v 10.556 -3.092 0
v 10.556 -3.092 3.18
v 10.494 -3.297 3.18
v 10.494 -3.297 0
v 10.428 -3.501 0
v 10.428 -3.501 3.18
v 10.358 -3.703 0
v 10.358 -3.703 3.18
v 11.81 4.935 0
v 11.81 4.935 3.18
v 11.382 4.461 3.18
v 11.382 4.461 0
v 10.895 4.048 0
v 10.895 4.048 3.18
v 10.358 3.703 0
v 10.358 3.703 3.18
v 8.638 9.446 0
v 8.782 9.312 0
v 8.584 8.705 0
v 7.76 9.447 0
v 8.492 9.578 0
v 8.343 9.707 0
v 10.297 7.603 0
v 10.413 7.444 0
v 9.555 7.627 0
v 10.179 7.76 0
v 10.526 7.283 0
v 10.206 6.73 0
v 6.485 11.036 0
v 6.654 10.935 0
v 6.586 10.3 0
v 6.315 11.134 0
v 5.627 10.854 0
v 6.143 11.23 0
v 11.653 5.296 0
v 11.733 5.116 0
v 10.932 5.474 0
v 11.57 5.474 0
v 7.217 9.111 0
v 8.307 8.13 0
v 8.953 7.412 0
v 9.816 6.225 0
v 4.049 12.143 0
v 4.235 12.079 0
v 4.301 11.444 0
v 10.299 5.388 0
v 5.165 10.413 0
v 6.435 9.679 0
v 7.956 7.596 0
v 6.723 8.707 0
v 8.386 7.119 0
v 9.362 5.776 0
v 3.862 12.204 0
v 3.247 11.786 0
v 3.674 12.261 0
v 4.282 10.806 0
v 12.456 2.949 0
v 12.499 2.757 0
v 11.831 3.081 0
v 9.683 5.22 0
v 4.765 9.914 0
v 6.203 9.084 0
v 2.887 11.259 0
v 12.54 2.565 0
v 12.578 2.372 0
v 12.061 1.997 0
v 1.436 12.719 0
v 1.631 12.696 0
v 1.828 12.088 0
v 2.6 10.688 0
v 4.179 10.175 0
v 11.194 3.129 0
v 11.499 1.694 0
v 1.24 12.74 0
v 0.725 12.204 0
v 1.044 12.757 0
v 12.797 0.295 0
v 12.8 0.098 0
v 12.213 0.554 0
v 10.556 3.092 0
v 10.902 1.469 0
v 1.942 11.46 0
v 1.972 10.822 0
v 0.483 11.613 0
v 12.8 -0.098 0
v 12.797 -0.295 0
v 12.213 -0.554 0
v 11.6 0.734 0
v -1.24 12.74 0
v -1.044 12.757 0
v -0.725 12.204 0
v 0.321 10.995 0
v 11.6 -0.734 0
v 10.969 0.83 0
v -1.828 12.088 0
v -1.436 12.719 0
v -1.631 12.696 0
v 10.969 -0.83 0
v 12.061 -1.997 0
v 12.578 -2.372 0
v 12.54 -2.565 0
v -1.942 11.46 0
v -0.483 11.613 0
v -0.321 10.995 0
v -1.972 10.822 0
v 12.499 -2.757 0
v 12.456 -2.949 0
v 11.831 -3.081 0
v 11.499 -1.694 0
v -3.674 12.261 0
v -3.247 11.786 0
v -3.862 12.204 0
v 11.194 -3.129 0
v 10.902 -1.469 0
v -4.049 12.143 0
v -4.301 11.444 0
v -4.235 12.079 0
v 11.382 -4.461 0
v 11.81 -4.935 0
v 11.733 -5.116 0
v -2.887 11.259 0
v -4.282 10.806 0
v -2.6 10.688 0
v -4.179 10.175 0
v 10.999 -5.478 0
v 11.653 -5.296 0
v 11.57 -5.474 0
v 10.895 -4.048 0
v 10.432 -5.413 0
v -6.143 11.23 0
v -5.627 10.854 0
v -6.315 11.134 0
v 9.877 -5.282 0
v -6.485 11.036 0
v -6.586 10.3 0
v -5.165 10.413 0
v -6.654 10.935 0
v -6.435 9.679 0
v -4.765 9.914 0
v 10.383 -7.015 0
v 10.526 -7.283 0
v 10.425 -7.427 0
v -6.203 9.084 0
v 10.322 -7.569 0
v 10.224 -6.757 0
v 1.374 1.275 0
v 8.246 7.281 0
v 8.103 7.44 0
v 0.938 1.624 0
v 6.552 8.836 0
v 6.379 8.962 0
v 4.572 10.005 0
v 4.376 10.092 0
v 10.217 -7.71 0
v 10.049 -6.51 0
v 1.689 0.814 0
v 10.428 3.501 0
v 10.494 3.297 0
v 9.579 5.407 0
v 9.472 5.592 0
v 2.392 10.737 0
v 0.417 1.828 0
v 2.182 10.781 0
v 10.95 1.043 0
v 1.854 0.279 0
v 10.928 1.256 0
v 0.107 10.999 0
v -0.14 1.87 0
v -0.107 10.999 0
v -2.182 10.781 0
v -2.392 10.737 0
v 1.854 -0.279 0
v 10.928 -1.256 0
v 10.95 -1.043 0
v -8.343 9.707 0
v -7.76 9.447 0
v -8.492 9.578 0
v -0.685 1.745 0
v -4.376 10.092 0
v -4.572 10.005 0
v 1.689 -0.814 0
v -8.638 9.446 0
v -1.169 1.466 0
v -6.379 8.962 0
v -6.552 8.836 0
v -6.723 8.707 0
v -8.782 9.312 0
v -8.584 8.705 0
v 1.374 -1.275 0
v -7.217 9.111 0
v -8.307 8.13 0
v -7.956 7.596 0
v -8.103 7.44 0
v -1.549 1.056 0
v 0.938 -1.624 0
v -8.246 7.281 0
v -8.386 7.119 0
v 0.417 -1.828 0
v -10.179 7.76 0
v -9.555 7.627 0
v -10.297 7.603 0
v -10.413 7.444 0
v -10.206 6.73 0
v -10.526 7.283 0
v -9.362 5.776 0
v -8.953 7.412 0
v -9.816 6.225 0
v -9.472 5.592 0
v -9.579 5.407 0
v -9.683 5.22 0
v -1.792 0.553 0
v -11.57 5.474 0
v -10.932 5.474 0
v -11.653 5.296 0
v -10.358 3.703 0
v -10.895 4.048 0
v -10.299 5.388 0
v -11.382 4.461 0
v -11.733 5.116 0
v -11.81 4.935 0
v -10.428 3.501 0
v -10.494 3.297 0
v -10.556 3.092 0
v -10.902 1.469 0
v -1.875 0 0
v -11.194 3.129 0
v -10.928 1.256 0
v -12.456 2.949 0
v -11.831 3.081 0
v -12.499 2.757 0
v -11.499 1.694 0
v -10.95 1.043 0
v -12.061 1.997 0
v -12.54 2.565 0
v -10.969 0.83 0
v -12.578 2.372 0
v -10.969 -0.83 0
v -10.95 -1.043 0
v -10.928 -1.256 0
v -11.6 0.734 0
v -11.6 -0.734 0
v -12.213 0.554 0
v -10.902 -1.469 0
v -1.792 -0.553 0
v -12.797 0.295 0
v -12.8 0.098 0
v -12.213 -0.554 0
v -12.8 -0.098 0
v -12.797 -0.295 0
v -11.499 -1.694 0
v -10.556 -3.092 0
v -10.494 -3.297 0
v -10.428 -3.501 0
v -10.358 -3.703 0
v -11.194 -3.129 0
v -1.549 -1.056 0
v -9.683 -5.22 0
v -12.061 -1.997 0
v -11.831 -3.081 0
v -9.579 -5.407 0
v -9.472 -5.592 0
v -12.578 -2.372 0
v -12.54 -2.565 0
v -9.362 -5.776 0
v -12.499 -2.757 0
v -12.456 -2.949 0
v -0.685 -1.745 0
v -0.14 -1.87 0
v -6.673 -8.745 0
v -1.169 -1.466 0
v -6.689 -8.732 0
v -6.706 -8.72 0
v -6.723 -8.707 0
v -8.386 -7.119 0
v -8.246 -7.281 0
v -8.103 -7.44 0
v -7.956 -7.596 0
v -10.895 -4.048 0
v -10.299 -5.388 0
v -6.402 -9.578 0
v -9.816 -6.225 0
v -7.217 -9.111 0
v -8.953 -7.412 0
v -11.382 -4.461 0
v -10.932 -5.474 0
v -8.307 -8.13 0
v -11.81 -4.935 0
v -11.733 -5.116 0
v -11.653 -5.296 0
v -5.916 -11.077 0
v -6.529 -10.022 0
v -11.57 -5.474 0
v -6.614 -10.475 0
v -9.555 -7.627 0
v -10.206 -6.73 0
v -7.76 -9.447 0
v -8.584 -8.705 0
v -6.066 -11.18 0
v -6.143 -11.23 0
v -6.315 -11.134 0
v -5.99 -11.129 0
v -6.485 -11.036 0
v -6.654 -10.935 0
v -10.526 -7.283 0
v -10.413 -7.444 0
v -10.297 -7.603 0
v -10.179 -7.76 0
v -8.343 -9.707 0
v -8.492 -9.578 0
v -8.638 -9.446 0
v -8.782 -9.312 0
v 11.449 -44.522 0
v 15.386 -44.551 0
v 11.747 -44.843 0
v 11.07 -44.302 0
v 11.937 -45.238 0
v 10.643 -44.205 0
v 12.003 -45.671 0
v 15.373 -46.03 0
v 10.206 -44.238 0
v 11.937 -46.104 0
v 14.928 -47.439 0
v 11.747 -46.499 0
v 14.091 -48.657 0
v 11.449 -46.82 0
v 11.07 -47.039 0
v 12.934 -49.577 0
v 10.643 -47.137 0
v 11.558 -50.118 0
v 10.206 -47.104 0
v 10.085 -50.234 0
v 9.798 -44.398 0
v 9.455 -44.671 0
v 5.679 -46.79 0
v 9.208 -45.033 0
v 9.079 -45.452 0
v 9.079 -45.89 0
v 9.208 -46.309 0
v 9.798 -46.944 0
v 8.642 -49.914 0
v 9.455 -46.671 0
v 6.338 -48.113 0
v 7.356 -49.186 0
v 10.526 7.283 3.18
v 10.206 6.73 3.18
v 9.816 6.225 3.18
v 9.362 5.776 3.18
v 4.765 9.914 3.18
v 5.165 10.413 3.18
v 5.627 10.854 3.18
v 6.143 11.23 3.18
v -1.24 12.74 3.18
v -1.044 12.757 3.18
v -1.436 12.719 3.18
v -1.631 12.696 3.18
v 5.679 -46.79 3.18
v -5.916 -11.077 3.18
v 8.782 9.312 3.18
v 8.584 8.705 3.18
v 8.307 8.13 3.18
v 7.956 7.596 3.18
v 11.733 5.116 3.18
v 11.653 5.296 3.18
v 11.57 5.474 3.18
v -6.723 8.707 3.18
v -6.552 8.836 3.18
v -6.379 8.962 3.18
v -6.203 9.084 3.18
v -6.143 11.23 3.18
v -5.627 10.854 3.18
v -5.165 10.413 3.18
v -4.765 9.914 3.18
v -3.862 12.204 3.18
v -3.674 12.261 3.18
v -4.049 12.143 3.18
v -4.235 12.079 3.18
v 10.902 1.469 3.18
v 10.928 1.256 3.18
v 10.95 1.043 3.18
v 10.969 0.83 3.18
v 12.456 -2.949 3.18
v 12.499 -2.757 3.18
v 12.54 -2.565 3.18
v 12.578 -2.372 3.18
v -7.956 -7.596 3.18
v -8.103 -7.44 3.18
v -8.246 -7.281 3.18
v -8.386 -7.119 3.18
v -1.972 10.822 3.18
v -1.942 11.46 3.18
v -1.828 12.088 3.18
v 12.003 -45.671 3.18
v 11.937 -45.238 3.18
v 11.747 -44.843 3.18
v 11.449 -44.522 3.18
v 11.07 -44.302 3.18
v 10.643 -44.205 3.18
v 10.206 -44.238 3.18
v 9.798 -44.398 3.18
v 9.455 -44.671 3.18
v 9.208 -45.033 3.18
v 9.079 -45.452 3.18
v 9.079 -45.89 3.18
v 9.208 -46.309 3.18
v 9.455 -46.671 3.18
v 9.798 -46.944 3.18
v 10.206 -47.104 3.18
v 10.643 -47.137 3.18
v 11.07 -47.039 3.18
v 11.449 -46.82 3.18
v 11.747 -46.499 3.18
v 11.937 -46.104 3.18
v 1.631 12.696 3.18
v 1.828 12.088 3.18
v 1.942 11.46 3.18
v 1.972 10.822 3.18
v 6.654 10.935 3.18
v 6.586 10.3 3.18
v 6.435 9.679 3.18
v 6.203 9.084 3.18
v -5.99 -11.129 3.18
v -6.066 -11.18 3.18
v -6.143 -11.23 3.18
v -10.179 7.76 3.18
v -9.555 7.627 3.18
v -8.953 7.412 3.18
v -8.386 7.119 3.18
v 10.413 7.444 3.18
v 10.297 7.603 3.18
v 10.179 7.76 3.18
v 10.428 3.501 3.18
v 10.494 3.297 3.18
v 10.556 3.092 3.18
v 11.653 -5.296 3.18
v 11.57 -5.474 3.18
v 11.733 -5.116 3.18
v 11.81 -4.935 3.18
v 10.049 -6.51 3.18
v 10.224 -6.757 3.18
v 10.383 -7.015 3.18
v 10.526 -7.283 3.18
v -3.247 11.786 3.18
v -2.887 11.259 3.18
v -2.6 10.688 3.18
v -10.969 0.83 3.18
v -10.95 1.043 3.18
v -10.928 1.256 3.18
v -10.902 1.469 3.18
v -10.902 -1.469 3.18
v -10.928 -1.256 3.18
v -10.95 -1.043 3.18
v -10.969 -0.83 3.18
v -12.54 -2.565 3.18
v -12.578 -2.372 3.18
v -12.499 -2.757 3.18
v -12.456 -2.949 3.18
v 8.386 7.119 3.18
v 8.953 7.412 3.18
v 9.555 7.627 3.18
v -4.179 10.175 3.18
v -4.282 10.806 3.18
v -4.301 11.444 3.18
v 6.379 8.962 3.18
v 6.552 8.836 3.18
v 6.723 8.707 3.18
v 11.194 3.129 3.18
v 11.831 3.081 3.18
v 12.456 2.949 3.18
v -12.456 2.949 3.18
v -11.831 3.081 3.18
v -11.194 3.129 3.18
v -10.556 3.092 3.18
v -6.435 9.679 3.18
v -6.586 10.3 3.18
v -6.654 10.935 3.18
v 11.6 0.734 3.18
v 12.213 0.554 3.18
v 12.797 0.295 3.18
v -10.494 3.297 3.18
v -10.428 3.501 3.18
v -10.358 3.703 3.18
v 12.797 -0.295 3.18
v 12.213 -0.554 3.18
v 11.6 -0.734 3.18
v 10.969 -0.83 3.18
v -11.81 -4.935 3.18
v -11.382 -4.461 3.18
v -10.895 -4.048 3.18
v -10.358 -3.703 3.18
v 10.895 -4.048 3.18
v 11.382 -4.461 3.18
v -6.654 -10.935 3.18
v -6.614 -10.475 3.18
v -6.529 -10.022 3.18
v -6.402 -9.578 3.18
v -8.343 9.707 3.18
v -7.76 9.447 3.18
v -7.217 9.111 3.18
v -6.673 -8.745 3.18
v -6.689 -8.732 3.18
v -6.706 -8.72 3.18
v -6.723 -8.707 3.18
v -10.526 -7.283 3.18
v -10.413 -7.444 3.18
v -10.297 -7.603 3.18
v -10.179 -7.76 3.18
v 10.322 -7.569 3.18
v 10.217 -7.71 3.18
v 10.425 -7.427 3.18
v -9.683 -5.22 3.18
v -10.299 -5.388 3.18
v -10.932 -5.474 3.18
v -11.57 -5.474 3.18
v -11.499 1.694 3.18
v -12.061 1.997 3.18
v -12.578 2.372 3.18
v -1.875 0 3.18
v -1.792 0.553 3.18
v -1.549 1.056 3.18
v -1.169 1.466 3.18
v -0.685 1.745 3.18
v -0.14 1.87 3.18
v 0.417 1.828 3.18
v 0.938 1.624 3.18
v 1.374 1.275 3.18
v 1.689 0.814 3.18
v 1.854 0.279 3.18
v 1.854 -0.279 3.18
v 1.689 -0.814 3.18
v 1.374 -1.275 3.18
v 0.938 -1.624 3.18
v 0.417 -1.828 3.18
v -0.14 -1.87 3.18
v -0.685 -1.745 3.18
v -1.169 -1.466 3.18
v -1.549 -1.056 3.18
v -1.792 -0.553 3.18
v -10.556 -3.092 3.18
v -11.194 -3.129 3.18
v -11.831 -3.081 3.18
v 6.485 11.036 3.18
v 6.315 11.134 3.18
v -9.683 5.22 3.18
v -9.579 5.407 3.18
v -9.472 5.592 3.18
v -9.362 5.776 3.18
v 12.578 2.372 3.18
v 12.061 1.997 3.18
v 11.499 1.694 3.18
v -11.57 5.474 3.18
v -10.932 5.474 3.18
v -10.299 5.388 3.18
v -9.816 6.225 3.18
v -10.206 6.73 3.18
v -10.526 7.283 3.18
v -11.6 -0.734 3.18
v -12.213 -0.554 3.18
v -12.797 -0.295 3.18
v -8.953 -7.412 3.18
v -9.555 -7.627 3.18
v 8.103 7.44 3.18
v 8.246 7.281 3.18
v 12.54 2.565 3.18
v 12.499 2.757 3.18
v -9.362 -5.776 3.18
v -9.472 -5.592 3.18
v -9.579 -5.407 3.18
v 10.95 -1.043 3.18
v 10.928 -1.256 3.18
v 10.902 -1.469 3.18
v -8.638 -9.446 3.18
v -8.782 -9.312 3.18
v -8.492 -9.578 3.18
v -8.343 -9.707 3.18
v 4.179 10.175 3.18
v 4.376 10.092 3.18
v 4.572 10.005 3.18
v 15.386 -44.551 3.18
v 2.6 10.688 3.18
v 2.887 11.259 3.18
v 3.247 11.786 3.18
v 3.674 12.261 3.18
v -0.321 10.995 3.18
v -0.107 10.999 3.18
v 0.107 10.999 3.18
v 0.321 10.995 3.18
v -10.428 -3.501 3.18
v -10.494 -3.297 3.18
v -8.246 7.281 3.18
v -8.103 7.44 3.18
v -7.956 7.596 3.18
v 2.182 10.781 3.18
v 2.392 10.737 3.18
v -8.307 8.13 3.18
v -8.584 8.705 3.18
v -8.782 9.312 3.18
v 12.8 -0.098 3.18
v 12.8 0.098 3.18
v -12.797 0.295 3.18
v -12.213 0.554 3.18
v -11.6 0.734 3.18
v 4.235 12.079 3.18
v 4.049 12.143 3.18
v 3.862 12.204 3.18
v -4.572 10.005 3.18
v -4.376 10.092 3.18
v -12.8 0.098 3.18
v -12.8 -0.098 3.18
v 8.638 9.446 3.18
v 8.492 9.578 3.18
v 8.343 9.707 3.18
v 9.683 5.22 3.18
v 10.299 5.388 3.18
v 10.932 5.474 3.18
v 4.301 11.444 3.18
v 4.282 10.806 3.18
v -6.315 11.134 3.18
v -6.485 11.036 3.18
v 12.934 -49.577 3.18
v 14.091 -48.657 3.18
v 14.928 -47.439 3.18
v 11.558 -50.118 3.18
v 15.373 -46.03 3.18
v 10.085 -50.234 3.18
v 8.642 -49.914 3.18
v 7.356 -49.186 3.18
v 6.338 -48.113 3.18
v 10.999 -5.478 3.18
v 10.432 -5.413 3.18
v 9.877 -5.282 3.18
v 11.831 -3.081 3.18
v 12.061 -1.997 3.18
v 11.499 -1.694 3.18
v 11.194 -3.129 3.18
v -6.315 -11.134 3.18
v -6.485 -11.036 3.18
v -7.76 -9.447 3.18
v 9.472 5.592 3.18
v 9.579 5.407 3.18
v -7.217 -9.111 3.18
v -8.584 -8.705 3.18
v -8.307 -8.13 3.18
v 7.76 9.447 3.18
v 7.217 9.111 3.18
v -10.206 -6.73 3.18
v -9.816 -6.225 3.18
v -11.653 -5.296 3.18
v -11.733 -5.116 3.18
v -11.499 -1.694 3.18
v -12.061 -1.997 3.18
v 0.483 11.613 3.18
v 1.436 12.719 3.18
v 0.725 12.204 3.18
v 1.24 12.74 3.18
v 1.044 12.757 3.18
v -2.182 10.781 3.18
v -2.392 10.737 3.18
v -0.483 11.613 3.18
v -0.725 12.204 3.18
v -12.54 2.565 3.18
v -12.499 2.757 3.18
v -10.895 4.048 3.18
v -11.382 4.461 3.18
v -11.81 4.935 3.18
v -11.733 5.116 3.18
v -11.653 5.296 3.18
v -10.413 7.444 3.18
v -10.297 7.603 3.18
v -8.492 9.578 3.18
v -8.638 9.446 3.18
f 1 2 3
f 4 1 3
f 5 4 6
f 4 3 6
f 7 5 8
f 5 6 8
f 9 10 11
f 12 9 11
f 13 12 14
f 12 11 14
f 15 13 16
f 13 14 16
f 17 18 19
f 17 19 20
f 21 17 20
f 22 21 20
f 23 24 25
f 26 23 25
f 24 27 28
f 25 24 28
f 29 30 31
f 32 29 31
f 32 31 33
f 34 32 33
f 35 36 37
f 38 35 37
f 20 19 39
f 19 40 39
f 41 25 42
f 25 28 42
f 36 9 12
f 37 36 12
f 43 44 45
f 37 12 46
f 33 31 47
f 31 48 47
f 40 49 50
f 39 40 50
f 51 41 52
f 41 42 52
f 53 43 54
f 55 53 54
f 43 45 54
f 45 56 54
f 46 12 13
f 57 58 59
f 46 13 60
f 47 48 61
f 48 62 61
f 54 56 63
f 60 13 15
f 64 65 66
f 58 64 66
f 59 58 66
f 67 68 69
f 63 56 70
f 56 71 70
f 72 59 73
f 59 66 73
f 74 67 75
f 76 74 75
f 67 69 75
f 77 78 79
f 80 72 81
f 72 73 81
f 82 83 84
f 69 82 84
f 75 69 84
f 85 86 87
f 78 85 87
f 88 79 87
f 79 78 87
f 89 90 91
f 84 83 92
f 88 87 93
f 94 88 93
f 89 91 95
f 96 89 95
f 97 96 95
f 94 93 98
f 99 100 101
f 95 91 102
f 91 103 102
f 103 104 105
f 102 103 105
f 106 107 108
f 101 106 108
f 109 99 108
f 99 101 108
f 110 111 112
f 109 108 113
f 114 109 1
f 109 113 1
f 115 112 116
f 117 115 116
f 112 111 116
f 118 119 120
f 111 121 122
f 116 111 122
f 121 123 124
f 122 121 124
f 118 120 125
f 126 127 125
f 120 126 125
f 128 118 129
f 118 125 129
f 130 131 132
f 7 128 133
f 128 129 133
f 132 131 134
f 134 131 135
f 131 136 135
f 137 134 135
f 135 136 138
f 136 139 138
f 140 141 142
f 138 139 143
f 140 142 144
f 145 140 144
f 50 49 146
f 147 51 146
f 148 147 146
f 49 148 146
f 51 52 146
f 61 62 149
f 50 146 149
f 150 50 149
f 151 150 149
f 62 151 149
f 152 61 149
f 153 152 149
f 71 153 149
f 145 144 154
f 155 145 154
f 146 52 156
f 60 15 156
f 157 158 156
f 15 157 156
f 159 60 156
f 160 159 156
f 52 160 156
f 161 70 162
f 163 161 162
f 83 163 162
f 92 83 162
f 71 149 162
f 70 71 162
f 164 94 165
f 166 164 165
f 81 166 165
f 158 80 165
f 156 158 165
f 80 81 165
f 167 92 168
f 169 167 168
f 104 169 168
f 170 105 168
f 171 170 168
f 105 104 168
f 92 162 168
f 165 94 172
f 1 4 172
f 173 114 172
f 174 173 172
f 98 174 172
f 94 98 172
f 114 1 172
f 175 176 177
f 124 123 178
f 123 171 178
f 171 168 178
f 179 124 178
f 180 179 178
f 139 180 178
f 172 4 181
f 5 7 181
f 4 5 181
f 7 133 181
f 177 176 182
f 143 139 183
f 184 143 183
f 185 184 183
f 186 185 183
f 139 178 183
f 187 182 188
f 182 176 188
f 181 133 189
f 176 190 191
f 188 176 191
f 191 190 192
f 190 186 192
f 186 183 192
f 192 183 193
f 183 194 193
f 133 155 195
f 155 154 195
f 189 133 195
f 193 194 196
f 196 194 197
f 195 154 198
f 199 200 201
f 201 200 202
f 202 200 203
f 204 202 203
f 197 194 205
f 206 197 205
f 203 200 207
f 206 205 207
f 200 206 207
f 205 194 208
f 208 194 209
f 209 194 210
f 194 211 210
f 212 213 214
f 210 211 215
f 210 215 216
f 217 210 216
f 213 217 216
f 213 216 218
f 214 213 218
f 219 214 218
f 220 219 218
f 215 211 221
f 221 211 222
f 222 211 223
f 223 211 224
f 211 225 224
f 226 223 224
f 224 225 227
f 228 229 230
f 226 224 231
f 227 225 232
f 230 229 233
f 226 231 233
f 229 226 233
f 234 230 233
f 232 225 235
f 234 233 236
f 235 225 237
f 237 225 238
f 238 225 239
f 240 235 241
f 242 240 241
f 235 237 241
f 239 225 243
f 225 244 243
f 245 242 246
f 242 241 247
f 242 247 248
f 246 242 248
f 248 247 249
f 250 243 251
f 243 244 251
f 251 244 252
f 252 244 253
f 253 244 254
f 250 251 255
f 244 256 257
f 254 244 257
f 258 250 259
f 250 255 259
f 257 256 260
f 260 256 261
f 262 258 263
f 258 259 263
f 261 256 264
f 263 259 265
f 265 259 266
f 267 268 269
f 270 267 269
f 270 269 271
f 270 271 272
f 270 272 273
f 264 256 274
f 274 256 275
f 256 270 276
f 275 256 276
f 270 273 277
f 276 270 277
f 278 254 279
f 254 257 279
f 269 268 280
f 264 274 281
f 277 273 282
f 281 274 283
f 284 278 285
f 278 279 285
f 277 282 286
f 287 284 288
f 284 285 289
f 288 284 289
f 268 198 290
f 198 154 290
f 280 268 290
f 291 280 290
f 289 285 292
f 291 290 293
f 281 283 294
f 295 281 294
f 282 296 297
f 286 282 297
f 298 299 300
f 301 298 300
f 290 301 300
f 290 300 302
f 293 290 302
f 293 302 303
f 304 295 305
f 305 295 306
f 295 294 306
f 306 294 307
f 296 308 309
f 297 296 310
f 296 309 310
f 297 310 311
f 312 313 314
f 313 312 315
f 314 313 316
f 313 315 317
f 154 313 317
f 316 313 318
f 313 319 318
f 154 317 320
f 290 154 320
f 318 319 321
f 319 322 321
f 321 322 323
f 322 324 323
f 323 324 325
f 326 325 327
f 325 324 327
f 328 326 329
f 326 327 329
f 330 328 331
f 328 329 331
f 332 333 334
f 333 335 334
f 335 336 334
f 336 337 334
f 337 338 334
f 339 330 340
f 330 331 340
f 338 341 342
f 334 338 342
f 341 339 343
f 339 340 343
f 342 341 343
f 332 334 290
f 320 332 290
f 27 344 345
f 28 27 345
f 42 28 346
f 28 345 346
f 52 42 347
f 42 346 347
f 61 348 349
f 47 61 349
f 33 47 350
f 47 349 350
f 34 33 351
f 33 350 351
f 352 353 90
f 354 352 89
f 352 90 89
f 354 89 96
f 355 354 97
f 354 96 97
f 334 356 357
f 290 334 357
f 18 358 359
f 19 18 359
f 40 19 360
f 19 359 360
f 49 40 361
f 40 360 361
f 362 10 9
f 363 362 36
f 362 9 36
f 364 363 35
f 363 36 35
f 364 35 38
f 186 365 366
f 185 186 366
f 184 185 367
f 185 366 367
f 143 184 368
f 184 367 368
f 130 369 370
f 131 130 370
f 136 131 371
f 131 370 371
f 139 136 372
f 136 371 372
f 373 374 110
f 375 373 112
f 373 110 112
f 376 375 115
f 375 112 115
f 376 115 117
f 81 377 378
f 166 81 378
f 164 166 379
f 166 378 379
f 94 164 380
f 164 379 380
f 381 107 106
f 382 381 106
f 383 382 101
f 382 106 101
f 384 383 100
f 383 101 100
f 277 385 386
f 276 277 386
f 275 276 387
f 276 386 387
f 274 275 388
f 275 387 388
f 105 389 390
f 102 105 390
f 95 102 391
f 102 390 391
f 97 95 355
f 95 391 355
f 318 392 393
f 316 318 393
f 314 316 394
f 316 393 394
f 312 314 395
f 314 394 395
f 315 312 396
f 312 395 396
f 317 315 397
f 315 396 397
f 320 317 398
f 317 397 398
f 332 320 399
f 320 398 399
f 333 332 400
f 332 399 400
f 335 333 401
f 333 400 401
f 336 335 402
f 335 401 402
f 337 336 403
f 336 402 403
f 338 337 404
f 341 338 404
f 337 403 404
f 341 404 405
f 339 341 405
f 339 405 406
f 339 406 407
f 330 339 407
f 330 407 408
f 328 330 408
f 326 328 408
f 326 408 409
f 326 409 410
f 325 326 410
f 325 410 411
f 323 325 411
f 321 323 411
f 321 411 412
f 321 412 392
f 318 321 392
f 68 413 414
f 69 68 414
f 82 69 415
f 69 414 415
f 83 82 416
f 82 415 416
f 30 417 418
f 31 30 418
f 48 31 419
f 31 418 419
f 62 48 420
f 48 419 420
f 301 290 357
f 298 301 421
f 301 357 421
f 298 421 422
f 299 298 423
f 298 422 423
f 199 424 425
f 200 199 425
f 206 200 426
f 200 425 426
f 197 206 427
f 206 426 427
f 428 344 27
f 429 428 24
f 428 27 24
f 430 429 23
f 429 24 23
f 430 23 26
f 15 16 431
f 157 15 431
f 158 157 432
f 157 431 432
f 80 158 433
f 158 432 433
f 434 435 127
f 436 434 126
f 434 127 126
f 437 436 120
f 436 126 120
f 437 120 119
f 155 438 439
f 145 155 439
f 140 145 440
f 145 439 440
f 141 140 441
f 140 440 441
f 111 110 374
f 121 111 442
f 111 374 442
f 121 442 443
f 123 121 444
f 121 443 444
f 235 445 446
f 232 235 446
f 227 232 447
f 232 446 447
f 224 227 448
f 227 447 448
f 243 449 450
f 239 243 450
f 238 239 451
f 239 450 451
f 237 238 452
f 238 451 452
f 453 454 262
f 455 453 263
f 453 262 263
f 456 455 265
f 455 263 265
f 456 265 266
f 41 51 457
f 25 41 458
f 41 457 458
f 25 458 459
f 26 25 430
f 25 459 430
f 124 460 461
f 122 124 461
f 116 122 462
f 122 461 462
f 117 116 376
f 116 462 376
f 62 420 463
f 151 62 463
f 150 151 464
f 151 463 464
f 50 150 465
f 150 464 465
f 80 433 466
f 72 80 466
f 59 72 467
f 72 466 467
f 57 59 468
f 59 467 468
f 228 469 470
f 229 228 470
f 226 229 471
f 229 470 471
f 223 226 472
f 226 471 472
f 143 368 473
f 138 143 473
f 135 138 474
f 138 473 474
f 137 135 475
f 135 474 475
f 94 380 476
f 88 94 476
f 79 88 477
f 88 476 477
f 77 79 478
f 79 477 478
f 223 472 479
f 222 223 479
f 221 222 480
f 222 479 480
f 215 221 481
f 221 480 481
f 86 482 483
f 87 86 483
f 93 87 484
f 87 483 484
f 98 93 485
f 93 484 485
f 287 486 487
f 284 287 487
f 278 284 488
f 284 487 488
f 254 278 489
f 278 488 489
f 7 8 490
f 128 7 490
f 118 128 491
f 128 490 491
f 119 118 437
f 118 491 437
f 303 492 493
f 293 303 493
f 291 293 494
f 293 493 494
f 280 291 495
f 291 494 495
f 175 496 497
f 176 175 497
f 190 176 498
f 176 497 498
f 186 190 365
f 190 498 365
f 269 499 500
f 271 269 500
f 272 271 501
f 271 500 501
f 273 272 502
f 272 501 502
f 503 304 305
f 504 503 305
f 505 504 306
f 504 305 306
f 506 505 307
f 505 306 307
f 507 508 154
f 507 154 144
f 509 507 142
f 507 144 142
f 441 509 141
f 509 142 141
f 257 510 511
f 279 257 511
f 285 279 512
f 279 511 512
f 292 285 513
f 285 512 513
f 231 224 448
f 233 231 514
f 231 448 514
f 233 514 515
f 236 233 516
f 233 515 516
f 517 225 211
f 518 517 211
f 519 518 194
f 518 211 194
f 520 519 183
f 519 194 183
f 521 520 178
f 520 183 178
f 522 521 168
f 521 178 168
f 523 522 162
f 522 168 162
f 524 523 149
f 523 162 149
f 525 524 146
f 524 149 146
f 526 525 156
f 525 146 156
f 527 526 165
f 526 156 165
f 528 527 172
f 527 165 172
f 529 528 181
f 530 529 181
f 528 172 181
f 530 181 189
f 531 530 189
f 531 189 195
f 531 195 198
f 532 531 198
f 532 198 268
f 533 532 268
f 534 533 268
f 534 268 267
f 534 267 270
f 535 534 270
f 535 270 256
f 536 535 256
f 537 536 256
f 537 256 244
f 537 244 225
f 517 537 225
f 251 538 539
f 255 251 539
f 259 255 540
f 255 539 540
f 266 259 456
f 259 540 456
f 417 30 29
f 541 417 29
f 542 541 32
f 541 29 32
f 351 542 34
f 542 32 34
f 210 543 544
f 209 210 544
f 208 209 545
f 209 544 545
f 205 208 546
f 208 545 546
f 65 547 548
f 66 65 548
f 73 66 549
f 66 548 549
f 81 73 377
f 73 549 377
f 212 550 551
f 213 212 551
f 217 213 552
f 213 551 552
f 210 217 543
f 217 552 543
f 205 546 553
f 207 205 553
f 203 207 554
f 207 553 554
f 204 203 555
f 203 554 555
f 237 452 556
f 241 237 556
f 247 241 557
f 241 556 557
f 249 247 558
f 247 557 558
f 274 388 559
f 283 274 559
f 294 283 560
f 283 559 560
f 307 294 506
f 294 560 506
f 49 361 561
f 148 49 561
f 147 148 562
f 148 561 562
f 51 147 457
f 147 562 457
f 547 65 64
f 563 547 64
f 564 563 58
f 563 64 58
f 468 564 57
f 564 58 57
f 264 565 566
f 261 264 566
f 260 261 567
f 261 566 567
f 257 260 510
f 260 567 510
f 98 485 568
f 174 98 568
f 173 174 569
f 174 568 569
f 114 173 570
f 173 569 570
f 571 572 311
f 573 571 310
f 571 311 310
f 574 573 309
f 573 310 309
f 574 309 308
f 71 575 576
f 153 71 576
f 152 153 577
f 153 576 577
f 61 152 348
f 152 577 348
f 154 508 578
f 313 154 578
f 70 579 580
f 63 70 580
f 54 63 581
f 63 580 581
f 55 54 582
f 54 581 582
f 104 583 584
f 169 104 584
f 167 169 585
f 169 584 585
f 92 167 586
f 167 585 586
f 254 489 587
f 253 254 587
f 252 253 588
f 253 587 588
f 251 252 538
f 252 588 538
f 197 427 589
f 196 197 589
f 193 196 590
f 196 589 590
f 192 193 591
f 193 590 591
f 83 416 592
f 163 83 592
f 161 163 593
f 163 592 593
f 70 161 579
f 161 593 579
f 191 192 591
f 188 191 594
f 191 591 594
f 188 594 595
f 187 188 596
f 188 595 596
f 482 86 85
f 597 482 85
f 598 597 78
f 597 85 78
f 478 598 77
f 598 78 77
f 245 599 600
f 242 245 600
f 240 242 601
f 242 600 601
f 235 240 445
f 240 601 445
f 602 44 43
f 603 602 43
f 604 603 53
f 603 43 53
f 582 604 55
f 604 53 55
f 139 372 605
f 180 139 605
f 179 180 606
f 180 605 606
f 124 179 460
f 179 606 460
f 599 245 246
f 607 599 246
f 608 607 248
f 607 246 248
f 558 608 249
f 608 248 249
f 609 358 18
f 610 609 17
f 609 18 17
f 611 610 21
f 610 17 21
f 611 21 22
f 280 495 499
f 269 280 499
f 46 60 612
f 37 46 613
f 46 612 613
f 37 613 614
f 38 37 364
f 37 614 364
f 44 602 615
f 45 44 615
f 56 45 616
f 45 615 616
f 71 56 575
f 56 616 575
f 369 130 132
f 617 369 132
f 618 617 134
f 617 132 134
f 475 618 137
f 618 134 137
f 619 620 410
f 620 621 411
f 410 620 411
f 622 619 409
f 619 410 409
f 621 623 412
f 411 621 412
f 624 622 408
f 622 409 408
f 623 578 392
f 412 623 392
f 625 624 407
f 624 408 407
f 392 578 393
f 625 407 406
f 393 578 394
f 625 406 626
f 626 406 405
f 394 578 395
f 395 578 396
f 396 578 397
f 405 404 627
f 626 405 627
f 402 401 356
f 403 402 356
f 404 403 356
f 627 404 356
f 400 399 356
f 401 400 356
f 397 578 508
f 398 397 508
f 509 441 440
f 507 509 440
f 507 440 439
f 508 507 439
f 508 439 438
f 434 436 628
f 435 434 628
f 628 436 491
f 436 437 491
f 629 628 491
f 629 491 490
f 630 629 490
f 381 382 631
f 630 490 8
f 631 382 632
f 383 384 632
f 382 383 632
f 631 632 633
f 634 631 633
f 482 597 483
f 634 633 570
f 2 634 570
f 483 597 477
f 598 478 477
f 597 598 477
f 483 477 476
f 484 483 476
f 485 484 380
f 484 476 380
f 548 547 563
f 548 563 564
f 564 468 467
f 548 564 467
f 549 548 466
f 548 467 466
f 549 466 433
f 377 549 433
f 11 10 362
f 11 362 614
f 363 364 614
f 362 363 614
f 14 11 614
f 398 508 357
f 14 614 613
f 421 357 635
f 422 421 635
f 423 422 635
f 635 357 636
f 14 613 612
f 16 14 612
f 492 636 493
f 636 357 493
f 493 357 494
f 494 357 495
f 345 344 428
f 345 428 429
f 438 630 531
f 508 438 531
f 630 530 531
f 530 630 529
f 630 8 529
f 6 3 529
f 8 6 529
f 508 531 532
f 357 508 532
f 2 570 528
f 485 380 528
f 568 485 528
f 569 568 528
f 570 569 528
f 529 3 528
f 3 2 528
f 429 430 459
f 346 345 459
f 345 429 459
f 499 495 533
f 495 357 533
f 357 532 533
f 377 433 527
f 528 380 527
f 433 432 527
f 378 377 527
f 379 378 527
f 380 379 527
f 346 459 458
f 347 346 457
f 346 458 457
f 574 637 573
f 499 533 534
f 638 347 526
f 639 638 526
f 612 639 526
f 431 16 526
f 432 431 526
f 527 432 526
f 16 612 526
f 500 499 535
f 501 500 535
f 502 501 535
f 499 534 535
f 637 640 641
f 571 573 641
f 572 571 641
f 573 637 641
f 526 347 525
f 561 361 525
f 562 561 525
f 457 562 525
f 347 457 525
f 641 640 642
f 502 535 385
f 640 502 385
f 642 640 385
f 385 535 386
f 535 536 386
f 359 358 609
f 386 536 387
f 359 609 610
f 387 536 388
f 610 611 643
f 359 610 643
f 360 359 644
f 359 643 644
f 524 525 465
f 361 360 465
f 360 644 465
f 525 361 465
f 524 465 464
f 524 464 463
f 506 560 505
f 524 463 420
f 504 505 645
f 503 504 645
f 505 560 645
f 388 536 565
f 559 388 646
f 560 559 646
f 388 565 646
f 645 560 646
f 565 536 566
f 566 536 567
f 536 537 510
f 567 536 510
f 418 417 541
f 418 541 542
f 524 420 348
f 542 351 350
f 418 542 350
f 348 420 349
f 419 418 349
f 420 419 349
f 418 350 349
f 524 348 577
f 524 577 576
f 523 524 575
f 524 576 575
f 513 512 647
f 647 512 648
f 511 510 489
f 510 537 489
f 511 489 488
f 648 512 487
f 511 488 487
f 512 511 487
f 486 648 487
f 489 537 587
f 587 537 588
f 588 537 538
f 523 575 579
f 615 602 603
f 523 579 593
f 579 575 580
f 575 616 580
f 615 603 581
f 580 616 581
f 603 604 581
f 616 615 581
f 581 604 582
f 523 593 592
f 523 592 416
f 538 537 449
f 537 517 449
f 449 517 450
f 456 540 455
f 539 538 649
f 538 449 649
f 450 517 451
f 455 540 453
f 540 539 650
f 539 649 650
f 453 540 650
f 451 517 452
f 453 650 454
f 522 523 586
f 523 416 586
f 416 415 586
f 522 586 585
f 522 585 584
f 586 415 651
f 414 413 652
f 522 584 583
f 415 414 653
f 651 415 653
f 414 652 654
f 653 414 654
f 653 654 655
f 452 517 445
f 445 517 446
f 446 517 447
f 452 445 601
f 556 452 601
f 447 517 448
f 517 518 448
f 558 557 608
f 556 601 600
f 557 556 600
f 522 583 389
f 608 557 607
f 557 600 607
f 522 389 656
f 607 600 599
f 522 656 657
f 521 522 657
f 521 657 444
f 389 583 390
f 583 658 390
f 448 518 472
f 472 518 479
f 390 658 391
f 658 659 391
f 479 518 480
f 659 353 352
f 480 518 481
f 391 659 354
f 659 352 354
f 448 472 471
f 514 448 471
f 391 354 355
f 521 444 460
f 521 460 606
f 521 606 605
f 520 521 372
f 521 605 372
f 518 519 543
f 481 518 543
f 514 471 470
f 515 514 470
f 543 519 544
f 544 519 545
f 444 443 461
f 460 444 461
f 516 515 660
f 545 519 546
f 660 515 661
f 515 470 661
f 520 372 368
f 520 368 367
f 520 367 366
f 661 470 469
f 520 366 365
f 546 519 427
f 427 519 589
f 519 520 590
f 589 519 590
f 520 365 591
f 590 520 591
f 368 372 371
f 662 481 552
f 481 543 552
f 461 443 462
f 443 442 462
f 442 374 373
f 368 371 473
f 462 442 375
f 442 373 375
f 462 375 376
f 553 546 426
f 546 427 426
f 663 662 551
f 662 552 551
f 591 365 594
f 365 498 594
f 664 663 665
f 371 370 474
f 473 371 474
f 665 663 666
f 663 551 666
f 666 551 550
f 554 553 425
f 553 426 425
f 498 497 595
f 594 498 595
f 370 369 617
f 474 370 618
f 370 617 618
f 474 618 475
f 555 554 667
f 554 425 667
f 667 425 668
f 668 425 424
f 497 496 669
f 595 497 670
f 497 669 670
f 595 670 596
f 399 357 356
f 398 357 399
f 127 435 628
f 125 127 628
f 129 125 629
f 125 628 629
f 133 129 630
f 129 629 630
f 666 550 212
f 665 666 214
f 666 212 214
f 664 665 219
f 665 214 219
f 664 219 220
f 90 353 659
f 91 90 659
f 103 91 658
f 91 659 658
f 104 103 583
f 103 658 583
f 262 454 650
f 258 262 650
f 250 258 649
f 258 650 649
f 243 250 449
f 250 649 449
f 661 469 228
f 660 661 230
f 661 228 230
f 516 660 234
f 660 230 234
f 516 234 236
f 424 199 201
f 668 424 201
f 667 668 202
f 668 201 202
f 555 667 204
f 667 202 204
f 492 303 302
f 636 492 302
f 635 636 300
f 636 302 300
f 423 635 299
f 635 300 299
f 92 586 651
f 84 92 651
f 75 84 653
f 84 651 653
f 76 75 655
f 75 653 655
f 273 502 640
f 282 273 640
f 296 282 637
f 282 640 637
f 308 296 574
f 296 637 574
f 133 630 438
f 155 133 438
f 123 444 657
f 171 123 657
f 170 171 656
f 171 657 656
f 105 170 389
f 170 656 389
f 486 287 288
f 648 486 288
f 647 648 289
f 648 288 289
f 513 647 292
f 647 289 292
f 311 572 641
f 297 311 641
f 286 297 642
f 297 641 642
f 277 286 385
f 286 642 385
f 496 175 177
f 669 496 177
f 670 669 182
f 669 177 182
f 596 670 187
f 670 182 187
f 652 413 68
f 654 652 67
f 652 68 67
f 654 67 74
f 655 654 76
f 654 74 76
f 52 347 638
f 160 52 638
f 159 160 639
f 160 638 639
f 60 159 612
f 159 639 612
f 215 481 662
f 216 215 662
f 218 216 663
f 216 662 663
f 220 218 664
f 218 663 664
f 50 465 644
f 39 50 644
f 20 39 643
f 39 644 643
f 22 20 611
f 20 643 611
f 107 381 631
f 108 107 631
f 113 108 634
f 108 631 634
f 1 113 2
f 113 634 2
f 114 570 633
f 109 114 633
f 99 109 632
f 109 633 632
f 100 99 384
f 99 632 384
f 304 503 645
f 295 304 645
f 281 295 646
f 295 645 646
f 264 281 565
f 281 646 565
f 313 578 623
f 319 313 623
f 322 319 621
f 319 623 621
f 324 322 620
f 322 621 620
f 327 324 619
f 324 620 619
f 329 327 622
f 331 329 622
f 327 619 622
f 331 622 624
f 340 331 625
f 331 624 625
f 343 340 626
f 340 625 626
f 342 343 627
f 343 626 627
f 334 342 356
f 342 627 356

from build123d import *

# Parameters (mm, degrees)
SKETCH1_R           = 12.8
BOSS_EXTRUDE1_DEPTH = 3.18
CUT_EXTRUDE1_DEPTH  = 19.379129468
CIRPATTERN1_COUNT   = 30
SKETCH4_R           = 1.875
CUT_EXTRUDE3_DEPTH  = 19.349437359
BOSS_EXTRUDE2_START = -3.18
BOSS_EXTRUDE2_DEPTH = 3.18
SKETCH7_R           = 1.47
CUT_EXTRUDE4_DEPTH  = 53.659533455


with BuildPart() as part:
    # Sketch1 → Boss-Extrude1 (new body)
    with BuildSketch(Plane.XY):
        with Locations(Location((0, 0, 0), (0, 0, 180))):
            Circle(SKETCH1_R)
    extrude(amount=BOSS_EXTRUDE1_DEPTH)

    # Sketch2 → Cut-Extrude1 (cut, through all)
    with BuildSketch(Plane.XY.offset(3.18)):
        with BuildLine():
            ThreePointArc((-0.321034752, 10.995314306), (0, 11), (0.321034752, 10.995314306))
            ThreePointArc((0.321034752, 10.995314306), (0.594388904, 11.912556329), (1.044293354, 12.75732932))
            ThreePointArc((1.044293354, 12.75732932), (0, 12.8), (-1.044293354, 12.75732932))
            ThreePointArc((-1.044293354, 12.75732932), (-0.594388904, 11.912556329), (-0.321034752, 10.995314306))
        make_face()
    cut_extrude1 = extrude(amount=-CUT_EXTRUDE1_DEPTH, mode=Mode.SUBTRACT)

    # CirPattern1: Cut-Extrude1 ×30 about axis
    cirpattern1_axis = Axis((0, 0, 0), (0, 0, 1))
    for i in range(1, CIRPATTERN1_COUNT):
        add(cut_extrude1.rotate(cirpattern1_axis, i * 360 / CIRPATTERN1_COUNT), mode=Mode.SUBTRACT)

    # Sketch4 → Cut-Extrude3 (cut, through all)
    with BuildSketch(Plane(origin=(0, 0, 0), x_dir=(-1, 0, 0), z_dir=(0, 0, -1))):
        Circle(SKETCH4_R)
    extrude(amount=-CUT_EXTRUDE3_DEPTH, mode=Mode.SUBTRACT)

    # Sketch6 → Boss-Extrude2 (add)
    with BuildSketch(Plane(origin=(0, 0, 0), x_dir=(-1, 0, 0), z_dir=(0, 0, -1)).offset(BOSS_EXTRUDE2_START)):
        with BuildLine():
            Line((-9.828614264, -4.939467749), (-15.386321044, -44.551484806))
            ThreePointArc((-15.386321044, -44.551484806), (-11.558440512, -50.118310067), (-5.67917693, -46.790176566))
            Line((-5.67917693, -46.790176566), (6.672650371, -8.74504071))
            ThreePointArc((6.672650371, -8.74504071), (-2.471967519, -10.71864621), (-9.828614264, -4.939467749))
        make_face()
    extrude(amount=BOSS_EXTRUDE2_DEPTH)

    # Sketch7 → Cut-Extrude4 (cut, through all)
    with BuildSketch(Plane.XY.offset(3.18)):
        with Locations((10.532748987, -45.670830686)):
            Circle(SKETCH7_R)
    extrude(amount=-CUT_EXTRUDE4_DEPTH, mode=Mode.SUBTRACT)


solid = part.part
